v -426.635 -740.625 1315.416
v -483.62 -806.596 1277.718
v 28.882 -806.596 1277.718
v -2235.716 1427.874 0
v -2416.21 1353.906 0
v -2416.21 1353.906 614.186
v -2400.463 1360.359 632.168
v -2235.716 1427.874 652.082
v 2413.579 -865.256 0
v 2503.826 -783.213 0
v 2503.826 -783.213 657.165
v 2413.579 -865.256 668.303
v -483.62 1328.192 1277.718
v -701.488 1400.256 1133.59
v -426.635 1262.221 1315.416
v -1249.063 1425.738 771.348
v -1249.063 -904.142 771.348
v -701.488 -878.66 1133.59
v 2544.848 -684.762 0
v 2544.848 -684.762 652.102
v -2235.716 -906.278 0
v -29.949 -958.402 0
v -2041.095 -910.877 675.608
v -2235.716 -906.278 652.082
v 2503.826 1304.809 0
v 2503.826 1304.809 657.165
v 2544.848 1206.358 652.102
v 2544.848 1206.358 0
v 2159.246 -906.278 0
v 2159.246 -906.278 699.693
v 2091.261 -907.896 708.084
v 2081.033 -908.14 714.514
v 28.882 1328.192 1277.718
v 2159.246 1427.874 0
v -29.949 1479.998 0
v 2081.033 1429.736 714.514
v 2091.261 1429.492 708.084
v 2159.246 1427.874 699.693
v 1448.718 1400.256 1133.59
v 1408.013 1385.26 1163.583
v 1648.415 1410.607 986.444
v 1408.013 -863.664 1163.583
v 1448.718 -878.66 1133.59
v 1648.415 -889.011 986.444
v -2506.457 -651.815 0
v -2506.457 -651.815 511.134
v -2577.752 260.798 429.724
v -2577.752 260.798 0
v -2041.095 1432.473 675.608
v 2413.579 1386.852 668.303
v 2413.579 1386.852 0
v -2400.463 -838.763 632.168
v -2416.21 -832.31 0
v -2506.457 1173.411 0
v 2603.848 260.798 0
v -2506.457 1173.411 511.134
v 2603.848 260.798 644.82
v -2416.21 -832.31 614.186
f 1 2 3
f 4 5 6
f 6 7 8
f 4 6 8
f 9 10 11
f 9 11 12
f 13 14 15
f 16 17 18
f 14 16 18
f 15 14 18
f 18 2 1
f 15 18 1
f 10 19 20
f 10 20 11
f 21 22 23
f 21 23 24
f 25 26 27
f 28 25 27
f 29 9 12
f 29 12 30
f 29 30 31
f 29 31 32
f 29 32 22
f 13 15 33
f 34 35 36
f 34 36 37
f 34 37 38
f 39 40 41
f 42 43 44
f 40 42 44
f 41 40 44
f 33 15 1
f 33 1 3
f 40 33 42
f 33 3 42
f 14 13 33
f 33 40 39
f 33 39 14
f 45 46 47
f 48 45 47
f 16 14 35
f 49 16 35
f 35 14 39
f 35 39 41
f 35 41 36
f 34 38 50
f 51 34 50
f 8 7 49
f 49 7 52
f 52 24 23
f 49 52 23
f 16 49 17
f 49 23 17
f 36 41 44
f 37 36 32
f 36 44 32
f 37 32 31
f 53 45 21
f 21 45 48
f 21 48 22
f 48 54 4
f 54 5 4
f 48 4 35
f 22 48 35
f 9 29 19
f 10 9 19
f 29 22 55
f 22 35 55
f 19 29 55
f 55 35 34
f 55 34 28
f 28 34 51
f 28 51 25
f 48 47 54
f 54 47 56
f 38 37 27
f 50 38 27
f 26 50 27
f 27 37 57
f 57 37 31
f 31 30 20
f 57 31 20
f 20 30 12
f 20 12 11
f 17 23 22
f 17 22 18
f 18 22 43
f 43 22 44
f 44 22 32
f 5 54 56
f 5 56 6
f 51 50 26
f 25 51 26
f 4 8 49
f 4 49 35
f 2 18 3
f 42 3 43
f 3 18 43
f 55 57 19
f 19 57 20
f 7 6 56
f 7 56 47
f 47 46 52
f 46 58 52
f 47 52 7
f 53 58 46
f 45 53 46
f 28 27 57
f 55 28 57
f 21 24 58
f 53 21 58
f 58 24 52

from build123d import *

# Parameters (mm, degrees)
F0_W     = 5181.6
F0_H     = 2438.4
F1_DEPTH = 1524
F2_W     = 6013.317108
F2_H     = 2221.975178
F4_DEPTH = 2438.401
F3_W     = 6408.629179
F3_H     = 3328.86374
F5_DEPTH = 1524.001
F6_W     = 3945.398092
F6_H     = 2208.867222
F7_DEPTH = 12700


with BuildPart() as f1:
    # F0 (on Top) → F1 (new body)
    with BuildSketch(Plane.XY):
        with Locations((13.048083, 260.797922)):
            Rectangle(F0_W, F0_H)
    extrude(amount=F1_DEPTH)

    # F2 (on face) → F4 (cut, through all)
    with BuildSketch(Plane.XZ.offset(958.402078)):
        with Locations((63.637257, 640.401438)):
            Rectangle(F2_W, F2_H)
        Polygon((2091.261387, 708.084106), (2603.848083, 644.820392), (2603.848083, 0), (-2577.751917, 0), (-2577.751917, 429.72371), (-2400.462866, 632.167637), (-1249.063134, 771.347821), (-426.634789, 1315.415859), (1408.012986, 1163.582921), (1648.415208, 986.444473), align=None, mode=Mode.SUBTRACT)
    extrude(amount=-F4_DEPTH, mode=Mode.SUBTRACT)

    # F3 (on face) → F5 (cut, through all)
    with BuildSketch(Plane.XY.offset(1524)):
        with Locations((28.381705, 245.088637)):
            Rectangle(F3_W, F3_H)
        Polygon((2544.847727, 1206.357837), (2603.848083, 260.797922), (2544.847727, -684.761993), (2503.82638, -783.213488), (2413.579226, -865.256421), (2159.246206, -906.277768), (-29.949147, -958.402078), (-2235.715866, -906.277768), (-2416.210175, -832.309715), (-2506.457329, -651.815407), (-2577.751917, 260.797922), (-2506.457329, 1173.41125), (-2416.210175, 1353.905559), (-2235.715866, 1427.873611), (-29.949147, 1479.997922), (2159.246206, 1427.873611), (2413.579226, 1386.852264), (2503.82638, 1304.809332), align=None, mode=Mode.SUBTRACT)
    extrude(amount=-F5_DEPTH, mode=Mode.SUBTRACT)

    # F6 (on Right) → F7 (cut, symmetric)
    with BuildSketch(Plane.YZ):
        with Locations((295.375705, 715.462372)):
            Rectangle(F6_W, F6_H)
        Polygon((260.797922, 0), (-958.402078, 0), (-878.660321, 1133.589864), (-806.59622, 1277.717948), (-617.428064, 1385.814071), (-145.066872, 1499.75121), (260.797922, 1524), (666.662716, 1499.75121), (1139.023908, 1385.814071), (1328.192063, 1277.717948), (1400.256165, 1133.589864), (1479.997922, 0), align=None, mode=Mode.SUBTRACT)
    extrude(amount=F7_DEPTH, both=True, mode=Mode.SUBTRACT)


solid = f1.part
